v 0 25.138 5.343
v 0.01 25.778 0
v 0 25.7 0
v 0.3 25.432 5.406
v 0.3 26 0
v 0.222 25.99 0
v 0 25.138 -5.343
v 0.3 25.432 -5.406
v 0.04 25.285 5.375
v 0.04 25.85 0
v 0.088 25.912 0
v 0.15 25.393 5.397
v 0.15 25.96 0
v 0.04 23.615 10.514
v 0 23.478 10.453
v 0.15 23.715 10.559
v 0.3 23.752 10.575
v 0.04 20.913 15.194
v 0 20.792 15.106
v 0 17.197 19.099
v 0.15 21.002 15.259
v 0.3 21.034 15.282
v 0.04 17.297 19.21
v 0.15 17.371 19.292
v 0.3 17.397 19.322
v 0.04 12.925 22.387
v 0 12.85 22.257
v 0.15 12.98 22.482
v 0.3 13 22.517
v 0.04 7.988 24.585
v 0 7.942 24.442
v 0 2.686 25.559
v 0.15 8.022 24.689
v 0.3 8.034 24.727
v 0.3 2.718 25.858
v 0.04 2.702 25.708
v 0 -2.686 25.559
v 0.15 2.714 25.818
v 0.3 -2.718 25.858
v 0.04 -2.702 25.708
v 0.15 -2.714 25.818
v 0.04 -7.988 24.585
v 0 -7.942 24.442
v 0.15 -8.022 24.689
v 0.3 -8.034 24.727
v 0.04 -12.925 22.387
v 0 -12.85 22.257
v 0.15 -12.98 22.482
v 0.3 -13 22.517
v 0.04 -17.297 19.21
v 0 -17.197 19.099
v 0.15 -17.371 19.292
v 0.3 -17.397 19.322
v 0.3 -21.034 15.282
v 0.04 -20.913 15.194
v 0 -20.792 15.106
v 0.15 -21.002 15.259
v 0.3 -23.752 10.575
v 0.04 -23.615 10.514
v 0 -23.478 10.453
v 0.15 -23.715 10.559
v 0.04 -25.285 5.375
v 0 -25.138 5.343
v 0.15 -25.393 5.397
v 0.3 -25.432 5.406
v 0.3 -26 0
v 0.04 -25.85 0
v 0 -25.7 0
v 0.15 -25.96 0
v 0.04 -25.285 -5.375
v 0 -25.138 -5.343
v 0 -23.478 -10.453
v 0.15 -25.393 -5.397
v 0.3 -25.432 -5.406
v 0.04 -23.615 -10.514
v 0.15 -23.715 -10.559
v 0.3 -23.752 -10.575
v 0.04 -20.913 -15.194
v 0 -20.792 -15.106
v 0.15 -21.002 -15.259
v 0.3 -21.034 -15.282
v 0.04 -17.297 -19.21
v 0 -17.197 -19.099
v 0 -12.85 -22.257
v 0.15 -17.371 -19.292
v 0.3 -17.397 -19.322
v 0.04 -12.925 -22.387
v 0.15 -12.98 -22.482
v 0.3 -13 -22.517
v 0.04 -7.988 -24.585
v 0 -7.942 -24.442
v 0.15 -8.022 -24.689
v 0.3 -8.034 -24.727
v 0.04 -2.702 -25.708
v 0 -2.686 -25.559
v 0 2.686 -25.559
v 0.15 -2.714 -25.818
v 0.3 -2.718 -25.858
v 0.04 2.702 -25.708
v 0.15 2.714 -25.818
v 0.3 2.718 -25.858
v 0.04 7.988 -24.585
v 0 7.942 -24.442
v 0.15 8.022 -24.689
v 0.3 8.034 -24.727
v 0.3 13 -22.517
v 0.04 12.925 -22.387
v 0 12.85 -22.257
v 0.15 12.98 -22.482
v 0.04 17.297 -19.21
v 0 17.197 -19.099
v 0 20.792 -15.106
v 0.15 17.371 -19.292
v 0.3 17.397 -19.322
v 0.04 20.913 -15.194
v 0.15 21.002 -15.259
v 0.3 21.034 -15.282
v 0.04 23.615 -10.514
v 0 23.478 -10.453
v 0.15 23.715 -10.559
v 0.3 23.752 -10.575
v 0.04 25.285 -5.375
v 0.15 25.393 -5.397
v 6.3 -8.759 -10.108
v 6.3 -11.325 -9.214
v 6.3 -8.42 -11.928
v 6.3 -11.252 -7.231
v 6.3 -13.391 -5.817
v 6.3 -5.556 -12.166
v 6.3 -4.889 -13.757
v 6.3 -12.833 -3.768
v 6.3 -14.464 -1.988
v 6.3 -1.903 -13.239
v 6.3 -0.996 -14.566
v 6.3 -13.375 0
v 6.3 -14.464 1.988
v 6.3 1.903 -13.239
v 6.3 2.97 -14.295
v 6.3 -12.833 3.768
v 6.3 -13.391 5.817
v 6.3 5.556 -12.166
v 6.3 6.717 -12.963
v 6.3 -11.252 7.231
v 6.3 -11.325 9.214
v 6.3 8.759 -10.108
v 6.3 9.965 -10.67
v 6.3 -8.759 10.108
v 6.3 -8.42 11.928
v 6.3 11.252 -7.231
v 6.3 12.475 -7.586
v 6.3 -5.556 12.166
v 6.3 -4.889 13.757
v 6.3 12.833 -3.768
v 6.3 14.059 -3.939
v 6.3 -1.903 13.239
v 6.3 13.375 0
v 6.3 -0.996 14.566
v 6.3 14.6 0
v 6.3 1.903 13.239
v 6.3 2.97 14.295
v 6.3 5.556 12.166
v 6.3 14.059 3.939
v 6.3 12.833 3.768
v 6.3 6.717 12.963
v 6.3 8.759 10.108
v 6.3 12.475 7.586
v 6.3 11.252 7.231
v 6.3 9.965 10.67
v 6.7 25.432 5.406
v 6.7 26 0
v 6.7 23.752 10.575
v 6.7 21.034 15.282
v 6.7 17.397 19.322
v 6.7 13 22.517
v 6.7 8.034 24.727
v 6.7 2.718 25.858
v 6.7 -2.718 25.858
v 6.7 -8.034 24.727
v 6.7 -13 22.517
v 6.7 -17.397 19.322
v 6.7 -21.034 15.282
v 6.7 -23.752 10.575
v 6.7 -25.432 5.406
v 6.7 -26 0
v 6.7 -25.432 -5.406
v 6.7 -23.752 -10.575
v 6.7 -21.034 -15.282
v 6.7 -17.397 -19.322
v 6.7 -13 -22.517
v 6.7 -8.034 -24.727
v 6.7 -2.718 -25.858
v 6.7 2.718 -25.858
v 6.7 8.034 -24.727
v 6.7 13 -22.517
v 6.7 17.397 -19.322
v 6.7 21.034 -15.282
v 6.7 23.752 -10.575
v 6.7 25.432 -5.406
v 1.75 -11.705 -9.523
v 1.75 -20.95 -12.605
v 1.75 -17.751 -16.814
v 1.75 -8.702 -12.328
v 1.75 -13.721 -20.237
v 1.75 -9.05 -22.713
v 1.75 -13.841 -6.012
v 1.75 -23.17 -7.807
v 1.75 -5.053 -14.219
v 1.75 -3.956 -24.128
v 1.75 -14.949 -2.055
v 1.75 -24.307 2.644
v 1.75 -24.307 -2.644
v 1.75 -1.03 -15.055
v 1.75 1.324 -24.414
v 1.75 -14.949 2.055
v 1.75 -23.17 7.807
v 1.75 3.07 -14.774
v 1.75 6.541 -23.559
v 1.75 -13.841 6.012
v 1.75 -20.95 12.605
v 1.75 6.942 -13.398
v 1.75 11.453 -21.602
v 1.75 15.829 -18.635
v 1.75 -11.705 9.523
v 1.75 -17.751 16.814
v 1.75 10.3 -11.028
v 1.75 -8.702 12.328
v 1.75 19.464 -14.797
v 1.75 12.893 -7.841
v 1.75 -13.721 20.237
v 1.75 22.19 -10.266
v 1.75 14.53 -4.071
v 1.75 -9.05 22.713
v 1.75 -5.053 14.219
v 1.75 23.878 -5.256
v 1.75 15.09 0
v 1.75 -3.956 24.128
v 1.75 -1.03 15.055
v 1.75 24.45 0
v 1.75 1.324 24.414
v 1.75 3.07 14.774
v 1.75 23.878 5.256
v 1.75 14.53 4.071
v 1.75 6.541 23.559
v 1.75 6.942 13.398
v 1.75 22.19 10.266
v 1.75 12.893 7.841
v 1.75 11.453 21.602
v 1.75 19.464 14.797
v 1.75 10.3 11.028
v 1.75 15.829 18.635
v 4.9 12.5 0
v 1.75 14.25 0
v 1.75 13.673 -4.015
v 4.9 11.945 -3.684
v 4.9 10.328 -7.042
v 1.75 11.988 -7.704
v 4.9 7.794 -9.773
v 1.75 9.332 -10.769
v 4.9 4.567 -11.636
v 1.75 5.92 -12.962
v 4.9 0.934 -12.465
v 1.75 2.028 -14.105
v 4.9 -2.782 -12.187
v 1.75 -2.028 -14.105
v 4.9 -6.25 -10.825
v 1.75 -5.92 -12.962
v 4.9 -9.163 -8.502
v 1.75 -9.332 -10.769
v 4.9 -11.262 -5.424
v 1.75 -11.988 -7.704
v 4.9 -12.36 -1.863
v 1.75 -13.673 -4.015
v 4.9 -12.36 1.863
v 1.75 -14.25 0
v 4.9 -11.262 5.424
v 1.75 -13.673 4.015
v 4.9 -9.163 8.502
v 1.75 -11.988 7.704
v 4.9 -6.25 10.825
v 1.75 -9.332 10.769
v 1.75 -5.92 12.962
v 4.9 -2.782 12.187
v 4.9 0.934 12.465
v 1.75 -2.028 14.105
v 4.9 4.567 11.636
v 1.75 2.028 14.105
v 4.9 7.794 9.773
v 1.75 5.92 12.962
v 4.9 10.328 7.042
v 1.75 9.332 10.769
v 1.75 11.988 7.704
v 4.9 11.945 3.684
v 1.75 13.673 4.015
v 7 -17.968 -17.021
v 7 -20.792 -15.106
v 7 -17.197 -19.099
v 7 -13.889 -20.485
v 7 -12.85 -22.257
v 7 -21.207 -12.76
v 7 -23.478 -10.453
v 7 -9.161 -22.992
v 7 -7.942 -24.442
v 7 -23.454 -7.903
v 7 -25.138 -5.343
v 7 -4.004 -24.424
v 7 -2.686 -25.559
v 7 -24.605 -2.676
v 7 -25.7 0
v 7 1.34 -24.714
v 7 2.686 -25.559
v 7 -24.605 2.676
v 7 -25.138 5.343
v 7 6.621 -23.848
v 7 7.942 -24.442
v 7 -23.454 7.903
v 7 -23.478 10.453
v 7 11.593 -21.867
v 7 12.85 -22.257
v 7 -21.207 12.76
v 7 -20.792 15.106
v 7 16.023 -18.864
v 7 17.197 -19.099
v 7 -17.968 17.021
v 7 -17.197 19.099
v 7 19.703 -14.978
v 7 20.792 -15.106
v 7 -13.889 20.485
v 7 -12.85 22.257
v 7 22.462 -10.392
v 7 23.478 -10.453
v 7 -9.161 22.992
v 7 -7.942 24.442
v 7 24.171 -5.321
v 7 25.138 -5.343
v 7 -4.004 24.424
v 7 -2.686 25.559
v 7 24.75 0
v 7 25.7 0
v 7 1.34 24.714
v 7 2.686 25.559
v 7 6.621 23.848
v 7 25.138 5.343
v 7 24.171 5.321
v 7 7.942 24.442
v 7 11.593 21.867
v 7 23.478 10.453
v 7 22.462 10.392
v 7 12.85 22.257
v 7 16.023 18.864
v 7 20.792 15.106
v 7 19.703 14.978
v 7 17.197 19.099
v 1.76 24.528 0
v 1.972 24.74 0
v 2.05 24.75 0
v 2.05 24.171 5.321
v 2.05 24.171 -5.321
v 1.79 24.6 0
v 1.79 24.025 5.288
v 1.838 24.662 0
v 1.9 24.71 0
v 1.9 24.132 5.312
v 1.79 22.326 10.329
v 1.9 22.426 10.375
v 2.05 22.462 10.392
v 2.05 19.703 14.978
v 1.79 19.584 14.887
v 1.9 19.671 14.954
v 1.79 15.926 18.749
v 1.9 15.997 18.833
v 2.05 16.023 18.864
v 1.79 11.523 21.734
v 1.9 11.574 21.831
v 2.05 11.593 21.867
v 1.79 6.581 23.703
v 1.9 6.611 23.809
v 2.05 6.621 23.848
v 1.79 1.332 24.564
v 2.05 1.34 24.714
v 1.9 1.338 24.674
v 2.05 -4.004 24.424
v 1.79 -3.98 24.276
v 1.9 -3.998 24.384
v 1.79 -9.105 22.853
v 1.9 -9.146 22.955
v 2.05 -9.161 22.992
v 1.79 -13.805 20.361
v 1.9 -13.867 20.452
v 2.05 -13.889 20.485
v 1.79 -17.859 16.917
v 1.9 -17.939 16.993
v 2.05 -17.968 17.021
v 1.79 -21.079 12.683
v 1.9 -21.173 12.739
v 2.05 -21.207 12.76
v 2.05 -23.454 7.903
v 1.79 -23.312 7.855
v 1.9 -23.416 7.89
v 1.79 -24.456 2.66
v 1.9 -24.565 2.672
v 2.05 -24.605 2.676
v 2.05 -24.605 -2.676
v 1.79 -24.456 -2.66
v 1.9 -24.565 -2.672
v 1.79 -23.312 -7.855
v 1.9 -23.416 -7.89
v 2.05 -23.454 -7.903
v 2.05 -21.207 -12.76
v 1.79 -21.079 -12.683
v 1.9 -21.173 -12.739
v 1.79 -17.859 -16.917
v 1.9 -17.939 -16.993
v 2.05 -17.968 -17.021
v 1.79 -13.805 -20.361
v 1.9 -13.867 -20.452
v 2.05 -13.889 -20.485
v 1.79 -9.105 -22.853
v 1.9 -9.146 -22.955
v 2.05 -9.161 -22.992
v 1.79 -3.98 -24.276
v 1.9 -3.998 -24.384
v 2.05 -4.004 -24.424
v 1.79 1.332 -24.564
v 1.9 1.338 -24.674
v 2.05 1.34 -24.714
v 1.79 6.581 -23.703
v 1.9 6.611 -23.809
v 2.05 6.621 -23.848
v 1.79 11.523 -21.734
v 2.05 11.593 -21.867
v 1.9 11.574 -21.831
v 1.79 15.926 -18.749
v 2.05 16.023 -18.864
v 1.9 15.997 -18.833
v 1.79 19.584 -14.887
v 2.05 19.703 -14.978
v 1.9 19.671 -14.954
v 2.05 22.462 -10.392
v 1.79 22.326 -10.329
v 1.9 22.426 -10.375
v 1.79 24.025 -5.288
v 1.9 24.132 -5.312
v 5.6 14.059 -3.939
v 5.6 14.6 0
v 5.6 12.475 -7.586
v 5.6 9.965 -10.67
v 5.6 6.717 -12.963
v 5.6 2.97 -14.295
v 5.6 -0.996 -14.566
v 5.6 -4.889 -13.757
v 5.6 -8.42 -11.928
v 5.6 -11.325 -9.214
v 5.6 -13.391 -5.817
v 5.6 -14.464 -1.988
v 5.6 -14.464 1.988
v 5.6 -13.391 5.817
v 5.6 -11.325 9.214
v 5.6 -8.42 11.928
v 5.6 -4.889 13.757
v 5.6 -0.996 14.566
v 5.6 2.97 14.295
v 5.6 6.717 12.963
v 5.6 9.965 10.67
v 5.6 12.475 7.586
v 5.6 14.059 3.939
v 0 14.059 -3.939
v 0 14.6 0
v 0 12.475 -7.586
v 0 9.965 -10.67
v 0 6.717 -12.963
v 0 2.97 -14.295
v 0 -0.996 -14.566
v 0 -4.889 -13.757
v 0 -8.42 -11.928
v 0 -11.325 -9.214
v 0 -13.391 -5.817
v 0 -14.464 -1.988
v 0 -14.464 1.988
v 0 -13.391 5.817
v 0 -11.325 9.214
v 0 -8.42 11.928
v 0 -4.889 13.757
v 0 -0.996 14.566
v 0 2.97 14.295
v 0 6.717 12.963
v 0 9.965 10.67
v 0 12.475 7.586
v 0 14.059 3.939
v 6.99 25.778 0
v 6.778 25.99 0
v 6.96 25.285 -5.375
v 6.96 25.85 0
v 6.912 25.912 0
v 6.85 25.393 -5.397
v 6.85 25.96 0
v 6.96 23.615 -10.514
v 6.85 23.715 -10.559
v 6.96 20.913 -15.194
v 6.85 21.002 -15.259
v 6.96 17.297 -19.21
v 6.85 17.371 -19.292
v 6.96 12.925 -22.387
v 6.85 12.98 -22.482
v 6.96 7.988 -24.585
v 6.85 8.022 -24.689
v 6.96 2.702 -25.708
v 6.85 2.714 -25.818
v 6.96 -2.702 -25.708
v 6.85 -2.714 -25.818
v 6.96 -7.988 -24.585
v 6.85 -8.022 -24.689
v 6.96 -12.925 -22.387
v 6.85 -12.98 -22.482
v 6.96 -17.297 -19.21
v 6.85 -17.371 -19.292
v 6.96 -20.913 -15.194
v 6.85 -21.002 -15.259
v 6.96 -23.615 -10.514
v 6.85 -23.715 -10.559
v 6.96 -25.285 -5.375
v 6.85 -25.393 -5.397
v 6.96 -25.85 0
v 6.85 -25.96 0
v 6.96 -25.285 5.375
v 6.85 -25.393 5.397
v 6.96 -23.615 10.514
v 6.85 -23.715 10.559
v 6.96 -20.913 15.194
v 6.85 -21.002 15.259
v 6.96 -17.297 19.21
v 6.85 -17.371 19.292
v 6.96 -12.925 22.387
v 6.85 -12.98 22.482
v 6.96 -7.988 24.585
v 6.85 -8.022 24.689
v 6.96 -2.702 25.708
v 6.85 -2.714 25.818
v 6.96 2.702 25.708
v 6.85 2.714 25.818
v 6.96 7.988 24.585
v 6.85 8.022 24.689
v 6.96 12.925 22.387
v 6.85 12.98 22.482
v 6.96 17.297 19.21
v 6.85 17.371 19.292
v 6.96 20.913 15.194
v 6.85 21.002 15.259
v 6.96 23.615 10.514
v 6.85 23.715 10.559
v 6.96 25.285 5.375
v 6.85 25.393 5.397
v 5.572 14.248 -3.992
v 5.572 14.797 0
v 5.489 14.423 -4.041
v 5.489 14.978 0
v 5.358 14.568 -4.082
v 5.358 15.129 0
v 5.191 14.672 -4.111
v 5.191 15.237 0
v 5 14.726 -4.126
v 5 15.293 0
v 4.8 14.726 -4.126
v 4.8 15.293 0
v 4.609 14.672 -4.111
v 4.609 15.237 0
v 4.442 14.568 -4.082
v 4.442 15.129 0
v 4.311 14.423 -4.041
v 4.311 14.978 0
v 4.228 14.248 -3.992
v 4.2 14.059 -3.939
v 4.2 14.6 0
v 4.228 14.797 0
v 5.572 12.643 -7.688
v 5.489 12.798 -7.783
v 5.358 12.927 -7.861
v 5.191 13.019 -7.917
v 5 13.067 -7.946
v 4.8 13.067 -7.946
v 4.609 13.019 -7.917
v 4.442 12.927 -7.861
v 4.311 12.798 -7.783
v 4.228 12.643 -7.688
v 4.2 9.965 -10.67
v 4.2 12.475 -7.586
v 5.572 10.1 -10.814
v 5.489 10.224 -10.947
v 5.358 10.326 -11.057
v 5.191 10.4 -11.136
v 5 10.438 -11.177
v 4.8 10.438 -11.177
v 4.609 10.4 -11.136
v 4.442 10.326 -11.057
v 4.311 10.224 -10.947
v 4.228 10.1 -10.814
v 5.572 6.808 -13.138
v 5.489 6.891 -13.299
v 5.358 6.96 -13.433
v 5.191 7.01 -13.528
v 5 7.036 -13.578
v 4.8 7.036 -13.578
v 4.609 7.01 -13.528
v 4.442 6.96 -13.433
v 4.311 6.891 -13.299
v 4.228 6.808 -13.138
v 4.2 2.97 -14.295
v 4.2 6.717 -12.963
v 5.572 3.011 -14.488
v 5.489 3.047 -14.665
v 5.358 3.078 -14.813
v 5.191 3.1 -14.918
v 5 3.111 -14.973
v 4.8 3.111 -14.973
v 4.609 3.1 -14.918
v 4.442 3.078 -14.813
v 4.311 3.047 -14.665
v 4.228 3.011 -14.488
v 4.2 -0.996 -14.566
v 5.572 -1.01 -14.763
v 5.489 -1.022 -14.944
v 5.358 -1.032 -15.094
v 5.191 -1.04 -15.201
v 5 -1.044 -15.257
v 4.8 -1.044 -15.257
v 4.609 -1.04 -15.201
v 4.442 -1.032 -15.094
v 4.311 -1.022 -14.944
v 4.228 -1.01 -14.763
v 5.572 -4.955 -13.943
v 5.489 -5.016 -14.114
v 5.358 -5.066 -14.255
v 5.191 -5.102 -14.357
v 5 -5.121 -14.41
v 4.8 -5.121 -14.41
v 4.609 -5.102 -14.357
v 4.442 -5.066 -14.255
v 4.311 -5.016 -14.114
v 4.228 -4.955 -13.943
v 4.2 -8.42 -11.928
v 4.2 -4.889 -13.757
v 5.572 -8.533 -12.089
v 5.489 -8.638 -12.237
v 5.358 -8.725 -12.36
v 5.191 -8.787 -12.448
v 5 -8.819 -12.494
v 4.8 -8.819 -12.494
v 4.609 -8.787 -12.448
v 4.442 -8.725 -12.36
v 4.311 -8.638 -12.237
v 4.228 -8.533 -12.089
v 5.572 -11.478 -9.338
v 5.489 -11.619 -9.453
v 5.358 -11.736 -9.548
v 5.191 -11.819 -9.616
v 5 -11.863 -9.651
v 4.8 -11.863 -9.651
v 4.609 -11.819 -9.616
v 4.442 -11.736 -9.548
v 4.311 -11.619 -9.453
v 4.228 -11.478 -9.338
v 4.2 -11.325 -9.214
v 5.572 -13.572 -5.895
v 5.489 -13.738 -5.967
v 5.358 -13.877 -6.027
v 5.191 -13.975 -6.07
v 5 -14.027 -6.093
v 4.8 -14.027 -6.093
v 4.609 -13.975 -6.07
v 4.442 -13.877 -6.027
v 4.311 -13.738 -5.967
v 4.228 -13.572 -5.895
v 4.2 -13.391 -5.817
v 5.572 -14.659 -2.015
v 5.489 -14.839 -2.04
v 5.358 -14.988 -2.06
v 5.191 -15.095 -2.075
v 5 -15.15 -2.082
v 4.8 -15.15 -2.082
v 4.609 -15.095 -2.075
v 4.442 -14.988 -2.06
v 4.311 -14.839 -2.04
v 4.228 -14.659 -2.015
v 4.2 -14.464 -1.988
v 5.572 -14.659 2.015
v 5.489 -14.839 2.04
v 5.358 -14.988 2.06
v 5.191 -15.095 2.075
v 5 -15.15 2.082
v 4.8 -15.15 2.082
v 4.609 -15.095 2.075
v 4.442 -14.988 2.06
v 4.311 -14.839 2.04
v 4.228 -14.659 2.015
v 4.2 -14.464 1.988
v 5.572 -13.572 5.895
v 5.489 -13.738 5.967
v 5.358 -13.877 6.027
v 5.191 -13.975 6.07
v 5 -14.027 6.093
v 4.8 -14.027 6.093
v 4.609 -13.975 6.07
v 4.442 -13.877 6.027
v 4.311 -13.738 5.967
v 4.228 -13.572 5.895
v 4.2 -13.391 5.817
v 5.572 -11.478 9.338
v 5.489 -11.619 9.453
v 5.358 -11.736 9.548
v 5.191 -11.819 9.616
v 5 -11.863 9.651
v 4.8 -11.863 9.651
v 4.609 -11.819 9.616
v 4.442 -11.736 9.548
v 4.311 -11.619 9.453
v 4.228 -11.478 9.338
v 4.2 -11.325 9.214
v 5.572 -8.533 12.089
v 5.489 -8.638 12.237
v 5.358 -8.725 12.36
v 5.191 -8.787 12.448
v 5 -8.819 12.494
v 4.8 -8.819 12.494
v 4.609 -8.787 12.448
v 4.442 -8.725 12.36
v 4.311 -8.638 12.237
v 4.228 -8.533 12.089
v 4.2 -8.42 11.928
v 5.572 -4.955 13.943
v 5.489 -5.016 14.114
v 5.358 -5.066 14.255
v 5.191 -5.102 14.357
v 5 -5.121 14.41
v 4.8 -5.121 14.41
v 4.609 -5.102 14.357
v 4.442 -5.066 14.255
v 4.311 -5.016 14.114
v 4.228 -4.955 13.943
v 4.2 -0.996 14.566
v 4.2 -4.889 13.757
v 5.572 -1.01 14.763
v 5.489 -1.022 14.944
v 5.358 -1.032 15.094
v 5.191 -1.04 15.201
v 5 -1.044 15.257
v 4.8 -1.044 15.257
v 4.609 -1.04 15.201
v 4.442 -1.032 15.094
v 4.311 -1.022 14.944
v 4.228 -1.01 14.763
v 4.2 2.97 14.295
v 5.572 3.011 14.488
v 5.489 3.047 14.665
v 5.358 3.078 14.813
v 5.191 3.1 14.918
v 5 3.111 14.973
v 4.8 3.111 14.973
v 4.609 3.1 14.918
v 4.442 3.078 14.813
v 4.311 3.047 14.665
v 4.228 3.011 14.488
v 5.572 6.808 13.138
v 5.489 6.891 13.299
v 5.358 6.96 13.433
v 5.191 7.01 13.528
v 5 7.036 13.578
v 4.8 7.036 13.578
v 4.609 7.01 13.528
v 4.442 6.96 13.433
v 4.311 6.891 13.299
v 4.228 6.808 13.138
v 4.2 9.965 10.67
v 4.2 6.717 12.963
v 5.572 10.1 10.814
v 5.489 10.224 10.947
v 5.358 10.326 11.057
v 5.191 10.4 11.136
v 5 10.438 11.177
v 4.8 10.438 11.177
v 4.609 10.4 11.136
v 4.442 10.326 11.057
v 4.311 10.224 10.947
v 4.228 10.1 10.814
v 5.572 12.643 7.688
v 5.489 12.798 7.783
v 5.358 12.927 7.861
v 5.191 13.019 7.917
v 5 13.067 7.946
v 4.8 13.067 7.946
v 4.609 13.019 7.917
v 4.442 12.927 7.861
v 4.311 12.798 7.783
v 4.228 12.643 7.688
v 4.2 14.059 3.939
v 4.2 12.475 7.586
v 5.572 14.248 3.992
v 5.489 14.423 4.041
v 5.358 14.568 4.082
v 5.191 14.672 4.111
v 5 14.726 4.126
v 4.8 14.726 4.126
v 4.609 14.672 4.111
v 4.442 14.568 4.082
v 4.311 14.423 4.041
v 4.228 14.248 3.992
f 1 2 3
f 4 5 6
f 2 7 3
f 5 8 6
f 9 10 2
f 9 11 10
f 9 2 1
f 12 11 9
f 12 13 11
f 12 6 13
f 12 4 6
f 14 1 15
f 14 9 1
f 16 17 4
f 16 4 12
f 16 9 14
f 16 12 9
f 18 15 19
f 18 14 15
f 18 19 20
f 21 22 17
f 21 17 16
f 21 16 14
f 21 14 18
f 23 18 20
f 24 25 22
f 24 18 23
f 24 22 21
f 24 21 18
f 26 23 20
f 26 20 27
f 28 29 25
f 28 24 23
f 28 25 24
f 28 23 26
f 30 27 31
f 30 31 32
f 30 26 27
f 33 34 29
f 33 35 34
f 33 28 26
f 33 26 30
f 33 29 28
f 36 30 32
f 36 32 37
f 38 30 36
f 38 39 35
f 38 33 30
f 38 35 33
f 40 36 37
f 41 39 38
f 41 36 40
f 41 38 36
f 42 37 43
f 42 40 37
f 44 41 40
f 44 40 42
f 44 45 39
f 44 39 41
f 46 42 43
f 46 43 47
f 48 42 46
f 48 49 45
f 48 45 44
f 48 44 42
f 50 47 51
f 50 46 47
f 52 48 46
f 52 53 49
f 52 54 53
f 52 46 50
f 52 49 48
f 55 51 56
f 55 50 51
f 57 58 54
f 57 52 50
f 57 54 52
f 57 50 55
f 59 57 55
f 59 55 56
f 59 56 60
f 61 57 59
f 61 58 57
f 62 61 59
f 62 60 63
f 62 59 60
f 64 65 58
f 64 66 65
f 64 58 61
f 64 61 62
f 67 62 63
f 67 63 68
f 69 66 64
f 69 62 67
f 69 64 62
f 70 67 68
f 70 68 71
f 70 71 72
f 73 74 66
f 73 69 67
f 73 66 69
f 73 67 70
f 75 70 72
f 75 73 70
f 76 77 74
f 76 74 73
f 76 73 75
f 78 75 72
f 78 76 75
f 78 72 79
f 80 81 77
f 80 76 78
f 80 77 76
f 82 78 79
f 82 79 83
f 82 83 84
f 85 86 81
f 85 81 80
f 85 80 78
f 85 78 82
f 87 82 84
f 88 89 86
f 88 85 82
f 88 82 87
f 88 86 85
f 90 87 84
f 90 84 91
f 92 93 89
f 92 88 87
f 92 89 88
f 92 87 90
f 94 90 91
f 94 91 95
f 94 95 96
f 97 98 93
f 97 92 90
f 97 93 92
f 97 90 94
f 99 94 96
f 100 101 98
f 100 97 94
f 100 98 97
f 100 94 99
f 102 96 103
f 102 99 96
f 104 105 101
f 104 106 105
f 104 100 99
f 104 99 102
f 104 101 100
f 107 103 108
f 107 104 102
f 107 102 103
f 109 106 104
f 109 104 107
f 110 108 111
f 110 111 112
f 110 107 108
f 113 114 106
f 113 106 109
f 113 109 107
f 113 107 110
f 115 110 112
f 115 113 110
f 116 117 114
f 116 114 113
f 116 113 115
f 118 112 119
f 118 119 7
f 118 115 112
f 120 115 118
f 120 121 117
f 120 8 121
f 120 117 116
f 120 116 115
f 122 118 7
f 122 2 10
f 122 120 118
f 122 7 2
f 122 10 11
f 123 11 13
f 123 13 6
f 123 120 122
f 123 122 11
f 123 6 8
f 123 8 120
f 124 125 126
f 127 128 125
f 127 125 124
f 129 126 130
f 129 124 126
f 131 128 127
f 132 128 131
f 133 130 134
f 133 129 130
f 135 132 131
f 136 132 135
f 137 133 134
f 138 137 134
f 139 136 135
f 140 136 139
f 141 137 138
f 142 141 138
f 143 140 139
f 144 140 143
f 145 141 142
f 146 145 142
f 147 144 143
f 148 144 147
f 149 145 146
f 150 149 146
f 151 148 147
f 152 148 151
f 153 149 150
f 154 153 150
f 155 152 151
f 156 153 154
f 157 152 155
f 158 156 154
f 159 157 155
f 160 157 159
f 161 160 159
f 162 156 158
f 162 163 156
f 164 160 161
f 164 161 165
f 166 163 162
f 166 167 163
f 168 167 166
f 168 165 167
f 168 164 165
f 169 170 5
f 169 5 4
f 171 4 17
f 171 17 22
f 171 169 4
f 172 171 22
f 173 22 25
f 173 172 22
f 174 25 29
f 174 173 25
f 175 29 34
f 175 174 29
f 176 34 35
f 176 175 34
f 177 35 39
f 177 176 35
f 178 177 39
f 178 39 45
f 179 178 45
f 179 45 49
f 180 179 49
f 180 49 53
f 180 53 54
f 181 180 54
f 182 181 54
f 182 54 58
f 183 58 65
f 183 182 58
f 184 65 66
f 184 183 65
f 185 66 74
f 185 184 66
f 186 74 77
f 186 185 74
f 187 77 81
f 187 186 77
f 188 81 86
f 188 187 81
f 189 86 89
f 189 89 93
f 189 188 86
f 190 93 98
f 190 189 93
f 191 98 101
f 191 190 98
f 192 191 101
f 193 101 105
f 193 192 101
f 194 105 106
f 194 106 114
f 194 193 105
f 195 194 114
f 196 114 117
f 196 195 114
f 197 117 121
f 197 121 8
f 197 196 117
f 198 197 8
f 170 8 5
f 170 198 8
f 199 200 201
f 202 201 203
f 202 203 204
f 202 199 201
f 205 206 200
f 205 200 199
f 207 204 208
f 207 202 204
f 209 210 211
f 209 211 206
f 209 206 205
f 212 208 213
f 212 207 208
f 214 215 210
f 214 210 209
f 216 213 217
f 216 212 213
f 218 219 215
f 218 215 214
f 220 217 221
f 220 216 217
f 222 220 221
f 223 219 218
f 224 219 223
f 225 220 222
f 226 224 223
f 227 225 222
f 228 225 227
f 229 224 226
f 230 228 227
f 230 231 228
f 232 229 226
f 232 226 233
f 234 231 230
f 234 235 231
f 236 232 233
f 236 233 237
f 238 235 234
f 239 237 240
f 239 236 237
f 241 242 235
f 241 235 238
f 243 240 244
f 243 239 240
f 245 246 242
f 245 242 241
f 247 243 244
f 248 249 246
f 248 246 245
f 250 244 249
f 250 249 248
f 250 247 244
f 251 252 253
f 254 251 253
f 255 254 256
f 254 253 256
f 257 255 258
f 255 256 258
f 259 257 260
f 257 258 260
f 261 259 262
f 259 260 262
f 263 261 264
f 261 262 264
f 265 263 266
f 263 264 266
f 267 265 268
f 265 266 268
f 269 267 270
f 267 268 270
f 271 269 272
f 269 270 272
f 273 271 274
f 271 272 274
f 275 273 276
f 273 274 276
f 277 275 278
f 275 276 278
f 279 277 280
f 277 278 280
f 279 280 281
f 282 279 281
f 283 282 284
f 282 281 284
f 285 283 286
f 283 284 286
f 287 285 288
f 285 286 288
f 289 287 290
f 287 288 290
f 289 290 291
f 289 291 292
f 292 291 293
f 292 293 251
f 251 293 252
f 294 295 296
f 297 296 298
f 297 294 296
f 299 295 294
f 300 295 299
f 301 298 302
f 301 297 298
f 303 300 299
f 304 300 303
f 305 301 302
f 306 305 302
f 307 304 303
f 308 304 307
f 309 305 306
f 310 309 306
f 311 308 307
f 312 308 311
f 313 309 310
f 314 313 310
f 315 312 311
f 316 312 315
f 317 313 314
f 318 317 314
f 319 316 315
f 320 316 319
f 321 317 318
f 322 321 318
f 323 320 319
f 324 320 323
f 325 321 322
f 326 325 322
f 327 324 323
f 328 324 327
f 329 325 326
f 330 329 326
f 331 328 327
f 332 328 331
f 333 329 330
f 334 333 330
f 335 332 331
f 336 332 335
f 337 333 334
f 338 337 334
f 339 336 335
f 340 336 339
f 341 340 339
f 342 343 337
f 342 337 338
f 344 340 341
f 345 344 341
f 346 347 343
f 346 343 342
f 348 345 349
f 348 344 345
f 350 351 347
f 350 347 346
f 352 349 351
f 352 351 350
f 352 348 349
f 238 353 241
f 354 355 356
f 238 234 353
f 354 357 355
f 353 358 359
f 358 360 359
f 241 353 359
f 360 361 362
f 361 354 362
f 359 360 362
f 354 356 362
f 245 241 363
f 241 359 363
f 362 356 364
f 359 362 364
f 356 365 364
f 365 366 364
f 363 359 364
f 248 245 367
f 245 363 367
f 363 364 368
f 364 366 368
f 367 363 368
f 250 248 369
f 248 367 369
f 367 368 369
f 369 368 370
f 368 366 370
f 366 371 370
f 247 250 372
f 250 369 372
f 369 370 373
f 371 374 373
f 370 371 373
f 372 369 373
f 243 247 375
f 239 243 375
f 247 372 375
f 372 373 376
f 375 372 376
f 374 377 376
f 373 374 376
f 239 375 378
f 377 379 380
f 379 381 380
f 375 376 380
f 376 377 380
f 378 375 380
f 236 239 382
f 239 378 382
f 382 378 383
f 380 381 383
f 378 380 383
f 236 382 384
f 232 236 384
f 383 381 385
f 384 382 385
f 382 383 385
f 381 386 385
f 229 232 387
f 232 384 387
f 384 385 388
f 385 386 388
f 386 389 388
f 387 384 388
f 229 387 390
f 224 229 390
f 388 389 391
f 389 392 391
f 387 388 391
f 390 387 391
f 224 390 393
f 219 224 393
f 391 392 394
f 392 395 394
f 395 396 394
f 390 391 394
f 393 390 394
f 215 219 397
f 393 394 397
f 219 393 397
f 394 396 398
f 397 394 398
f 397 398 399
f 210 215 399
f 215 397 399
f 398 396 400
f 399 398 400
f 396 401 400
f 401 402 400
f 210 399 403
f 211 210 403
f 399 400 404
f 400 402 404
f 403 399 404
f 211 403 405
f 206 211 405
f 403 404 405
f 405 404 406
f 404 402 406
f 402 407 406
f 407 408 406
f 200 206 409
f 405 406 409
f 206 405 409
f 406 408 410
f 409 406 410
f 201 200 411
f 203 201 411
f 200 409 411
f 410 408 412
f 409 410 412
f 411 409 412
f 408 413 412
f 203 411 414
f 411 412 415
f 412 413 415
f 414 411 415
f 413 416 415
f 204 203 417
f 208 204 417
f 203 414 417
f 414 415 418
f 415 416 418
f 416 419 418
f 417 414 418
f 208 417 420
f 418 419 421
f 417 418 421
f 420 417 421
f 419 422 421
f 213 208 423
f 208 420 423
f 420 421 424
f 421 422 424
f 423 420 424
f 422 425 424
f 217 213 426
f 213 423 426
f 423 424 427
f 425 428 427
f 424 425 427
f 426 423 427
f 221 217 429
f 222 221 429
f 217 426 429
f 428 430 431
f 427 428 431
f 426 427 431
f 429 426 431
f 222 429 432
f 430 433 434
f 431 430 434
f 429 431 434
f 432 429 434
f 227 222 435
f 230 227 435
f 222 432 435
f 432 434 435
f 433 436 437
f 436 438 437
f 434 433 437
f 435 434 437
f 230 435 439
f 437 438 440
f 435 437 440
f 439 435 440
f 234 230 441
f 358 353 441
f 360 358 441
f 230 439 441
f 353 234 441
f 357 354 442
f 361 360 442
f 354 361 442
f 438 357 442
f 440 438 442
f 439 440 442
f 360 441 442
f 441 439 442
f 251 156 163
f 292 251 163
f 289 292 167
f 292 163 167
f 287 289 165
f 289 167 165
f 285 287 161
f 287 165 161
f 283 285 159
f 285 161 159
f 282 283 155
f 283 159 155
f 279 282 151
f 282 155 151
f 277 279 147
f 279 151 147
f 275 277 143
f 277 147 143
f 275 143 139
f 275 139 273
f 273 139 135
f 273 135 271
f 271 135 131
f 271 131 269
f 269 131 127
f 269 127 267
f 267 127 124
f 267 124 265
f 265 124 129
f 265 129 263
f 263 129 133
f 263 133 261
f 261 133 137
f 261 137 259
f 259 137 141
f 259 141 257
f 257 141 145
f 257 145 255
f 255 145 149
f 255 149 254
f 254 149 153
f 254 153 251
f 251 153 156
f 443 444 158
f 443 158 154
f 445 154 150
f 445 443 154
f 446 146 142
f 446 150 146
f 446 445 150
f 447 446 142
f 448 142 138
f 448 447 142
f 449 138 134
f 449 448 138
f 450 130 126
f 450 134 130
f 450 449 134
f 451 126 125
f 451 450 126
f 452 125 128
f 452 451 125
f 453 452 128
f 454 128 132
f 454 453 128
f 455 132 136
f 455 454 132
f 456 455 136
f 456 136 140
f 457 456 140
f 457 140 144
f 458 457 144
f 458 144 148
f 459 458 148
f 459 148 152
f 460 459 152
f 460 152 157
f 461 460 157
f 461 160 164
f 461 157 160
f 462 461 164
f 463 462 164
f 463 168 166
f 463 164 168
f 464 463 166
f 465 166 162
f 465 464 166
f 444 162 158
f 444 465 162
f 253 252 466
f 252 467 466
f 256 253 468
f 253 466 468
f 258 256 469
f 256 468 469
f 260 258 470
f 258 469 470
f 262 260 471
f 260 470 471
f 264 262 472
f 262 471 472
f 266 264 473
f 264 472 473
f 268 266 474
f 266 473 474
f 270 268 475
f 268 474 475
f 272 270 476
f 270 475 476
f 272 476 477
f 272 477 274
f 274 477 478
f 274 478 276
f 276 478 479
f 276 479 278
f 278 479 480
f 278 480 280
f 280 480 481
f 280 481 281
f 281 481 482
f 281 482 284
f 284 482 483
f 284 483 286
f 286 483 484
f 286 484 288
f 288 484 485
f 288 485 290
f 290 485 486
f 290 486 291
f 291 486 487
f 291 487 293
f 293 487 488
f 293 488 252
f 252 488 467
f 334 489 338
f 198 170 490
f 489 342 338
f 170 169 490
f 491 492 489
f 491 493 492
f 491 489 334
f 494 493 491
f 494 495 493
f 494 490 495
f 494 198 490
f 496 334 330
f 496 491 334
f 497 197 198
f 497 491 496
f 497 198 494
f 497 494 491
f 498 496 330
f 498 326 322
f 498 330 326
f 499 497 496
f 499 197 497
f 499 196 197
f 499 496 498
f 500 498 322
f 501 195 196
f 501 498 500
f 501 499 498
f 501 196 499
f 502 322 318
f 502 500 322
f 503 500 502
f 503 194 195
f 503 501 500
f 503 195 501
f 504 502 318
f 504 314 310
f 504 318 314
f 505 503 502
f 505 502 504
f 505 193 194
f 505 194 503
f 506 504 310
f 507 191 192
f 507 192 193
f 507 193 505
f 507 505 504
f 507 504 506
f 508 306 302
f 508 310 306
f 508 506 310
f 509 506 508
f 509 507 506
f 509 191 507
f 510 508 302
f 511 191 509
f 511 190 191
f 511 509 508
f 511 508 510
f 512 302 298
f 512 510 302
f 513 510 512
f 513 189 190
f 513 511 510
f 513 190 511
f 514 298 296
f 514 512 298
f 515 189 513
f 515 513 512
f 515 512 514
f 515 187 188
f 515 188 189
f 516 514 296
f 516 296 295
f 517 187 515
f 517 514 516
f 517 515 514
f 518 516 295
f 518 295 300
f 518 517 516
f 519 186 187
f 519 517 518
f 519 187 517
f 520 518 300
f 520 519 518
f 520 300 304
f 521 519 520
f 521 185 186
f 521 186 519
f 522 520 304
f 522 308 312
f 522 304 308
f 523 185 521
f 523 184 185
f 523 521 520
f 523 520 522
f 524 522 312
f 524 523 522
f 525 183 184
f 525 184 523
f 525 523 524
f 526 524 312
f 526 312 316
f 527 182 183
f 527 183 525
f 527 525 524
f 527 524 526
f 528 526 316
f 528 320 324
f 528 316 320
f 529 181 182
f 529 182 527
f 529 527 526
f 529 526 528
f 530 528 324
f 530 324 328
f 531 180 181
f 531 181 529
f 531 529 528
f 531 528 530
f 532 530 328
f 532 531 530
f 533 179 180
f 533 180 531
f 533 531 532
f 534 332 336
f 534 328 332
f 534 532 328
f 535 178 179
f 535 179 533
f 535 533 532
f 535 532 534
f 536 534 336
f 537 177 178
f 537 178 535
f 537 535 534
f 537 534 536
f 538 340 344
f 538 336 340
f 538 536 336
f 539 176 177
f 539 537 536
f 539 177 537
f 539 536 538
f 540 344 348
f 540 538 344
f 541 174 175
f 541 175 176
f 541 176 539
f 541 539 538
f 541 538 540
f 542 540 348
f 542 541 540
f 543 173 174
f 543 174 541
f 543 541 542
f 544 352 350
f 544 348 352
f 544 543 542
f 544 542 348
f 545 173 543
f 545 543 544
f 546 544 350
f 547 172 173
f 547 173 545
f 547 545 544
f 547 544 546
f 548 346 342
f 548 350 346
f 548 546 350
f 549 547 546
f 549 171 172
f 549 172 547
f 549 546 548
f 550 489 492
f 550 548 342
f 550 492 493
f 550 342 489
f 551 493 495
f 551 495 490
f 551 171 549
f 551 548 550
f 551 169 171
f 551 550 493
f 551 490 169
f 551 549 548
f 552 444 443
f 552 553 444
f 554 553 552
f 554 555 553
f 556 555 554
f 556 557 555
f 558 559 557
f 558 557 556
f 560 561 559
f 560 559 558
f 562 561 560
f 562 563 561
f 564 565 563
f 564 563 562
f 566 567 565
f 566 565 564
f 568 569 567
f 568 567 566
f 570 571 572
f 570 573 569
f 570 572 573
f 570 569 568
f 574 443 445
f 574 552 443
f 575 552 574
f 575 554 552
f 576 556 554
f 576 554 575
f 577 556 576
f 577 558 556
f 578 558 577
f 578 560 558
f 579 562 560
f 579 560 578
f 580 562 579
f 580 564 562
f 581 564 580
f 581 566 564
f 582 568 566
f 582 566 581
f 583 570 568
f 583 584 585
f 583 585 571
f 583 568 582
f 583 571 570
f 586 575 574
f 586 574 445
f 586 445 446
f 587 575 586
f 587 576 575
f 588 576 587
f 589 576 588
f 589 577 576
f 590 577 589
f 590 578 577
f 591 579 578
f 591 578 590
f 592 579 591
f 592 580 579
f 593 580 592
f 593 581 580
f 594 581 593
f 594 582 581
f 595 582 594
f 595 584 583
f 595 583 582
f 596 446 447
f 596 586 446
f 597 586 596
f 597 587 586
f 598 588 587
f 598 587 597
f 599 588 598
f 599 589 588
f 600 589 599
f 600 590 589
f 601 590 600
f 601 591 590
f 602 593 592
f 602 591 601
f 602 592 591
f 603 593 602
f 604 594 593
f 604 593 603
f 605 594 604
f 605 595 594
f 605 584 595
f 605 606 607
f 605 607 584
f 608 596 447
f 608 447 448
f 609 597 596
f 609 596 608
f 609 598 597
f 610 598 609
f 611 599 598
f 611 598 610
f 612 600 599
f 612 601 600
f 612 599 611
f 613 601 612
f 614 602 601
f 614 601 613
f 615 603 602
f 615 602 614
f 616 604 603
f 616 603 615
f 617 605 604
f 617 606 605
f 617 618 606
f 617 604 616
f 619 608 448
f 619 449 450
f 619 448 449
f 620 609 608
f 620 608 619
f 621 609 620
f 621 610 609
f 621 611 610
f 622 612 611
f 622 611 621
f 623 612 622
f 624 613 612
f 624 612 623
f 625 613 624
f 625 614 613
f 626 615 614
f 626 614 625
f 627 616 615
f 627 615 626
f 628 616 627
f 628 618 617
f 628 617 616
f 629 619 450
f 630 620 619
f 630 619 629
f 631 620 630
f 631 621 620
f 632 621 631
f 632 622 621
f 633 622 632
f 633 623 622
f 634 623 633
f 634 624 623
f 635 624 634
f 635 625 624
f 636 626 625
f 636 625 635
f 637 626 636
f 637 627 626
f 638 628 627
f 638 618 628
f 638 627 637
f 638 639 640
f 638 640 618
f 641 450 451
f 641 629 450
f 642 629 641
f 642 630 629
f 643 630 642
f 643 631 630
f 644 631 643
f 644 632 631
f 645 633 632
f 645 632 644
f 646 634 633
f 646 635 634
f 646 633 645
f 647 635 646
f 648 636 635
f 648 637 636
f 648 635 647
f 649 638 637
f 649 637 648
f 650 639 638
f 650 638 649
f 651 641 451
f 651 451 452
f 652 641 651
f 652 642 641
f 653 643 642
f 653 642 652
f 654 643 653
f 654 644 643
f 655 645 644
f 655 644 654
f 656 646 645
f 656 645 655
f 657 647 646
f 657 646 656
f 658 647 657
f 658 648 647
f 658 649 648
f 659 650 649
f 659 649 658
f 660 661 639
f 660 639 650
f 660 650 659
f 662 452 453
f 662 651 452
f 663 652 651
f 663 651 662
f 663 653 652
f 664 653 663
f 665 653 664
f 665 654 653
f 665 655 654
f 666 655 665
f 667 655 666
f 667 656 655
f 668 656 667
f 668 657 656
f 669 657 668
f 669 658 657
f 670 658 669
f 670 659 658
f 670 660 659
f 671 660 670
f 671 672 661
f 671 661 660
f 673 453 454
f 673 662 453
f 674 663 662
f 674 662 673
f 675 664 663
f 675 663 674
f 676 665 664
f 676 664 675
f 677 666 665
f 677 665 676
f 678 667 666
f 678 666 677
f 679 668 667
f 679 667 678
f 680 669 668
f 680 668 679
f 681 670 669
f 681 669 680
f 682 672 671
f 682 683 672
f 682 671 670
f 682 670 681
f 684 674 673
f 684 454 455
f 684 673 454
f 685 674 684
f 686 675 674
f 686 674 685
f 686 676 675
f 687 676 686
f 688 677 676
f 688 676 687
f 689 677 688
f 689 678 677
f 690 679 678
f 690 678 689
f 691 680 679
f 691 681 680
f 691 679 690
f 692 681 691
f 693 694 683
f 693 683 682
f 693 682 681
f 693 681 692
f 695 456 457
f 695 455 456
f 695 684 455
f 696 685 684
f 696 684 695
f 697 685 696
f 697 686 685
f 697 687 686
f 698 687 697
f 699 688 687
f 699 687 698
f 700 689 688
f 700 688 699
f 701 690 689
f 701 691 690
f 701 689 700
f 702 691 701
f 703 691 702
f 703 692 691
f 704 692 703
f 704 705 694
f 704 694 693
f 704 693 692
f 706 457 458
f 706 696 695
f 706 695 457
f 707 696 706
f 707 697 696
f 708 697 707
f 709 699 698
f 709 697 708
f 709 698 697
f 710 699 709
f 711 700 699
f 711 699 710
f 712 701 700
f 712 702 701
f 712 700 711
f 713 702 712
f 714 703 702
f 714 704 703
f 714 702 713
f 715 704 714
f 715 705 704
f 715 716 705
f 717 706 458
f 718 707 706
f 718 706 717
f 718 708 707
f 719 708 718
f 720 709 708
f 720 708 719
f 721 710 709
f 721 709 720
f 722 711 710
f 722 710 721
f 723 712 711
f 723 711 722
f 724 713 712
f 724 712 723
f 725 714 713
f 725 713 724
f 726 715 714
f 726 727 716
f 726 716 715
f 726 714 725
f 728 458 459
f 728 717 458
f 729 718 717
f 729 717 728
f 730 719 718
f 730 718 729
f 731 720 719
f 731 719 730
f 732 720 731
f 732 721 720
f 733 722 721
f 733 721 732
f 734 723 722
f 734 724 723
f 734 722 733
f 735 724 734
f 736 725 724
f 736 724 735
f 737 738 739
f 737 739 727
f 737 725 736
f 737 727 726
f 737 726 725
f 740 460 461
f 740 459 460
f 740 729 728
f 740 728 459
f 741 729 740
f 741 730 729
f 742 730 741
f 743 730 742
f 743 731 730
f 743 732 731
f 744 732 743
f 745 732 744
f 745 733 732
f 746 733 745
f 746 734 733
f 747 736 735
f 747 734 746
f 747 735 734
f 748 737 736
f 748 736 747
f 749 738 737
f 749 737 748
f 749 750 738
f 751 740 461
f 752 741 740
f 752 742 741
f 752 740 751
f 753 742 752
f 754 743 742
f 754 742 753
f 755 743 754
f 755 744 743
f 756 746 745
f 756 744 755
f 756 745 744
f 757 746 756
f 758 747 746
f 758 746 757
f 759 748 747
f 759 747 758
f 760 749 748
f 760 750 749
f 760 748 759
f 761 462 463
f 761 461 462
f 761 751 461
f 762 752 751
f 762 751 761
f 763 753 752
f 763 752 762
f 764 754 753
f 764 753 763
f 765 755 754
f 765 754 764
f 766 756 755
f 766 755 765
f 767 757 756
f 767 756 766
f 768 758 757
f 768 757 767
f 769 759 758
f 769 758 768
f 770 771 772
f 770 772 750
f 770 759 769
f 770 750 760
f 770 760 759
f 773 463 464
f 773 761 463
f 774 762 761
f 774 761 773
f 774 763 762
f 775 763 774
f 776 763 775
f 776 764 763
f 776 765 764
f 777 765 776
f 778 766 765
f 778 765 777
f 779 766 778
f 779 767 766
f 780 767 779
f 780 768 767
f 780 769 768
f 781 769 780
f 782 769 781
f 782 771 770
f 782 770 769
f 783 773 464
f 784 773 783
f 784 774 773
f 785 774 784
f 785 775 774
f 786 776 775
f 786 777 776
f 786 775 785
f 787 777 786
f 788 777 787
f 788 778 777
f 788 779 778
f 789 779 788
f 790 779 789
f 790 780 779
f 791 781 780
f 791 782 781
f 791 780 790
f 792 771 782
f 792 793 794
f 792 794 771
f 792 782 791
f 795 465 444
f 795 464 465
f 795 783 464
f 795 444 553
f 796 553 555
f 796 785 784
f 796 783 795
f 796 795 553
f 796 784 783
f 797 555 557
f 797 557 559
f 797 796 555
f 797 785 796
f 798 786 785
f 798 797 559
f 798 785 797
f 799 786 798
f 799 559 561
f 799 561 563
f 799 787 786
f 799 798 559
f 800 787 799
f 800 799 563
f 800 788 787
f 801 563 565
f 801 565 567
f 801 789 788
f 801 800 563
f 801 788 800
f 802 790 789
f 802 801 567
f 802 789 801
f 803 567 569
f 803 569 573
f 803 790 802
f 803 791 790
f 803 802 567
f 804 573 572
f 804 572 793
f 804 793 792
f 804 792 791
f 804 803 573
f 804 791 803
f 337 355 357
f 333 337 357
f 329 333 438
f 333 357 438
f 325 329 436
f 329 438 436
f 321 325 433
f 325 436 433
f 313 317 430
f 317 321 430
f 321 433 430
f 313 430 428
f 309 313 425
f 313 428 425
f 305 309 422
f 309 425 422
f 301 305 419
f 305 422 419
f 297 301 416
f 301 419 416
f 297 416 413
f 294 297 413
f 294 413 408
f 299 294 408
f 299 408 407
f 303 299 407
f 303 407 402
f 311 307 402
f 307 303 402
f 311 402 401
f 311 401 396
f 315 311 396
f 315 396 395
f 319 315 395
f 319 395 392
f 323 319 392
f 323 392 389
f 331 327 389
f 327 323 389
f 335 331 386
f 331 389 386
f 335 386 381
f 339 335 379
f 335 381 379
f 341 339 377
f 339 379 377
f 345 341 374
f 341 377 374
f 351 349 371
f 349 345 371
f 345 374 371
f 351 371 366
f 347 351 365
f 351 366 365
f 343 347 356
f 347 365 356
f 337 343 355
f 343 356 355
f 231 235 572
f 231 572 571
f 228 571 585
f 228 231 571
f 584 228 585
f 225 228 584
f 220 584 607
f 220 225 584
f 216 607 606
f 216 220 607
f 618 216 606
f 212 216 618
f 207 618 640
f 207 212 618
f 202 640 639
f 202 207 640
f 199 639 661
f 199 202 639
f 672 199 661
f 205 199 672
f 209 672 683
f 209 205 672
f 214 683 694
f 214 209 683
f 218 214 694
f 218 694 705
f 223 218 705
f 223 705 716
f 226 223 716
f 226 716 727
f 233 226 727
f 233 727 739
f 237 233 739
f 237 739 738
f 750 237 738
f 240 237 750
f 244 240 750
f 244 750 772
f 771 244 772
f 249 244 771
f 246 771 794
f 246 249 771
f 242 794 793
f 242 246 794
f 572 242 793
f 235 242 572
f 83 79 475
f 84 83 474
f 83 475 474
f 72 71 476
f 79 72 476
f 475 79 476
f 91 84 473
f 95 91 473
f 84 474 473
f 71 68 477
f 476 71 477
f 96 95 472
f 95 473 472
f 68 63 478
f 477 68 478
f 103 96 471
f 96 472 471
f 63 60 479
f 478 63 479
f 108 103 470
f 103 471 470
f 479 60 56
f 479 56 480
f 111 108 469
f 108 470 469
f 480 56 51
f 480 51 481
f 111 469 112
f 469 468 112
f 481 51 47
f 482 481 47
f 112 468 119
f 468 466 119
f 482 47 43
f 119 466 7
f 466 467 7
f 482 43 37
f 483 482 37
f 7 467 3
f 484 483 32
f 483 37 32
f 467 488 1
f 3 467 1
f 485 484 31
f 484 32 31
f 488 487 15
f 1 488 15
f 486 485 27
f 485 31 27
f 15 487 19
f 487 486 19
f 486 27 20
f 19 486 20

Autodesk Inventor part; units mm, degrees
ref_plane "YZ Plane" through (0, 0, 0) normal (1, 0, 0) x (0, 1, 0)
ref_plane "XZ Plane" through (0, 0, 0) normal (0, 1, 0) x (-1, 0, 0)
ref_plane "XY Plane" through (0, 0, 0) normal (0, 0, 1) x (1, 0, 0)
sketch "Sketch1" plane through (0, 0, 0) normal (0, 0, 1) x (1, 0, 0)
  circle A0 centre (4.9, 14.6) radius 0.455
  circle A1 centre (4.9, 14.6) radius 0.7
  line L0 (6.3, 13.375) -> (6.3, 14.6)
  line L1 (0, 26) -> (7, 26)
  line L2 (7, 26) -> (7, 24.75)
  line L3 (7, 24.75) -> (1.75, 24.75)
  line L4 (0, 0) -> (9.5856, 0)
  line L5 (0, 26) -> (0, 14.6)
  line L6 (0, 14.6) -> (1.75, 14.25)
  line L7 (1.75, 14.25) -> (4.9, 12.5)
  line L8 (4.9, 12.5) -> (6.3, 13.375)
  line L9 (4.9, 12.5) -> (0, 12.5) construction
  line L10 (0, 18) -> (0, -3) projected
  line L11 (-1.9171, 0) -> (11.5027, 0) projected
  line L12 (4.2, 14.6) -> (1.75, 15.09)
  line L13 (1.75, 15.09) -> (1.75, 24.75)
  line L14 (6.3, 14.6) -> (5.6, 14.6)
  dimension "d0" = 52
  dimension "d1" = 26.75
  dimension "d2" = 1.25
  dimension "d3" = 0.91
  dimension "d4" = 1.4
  dimension "d5" = 25
  dimension "d6" = 28.5
  dimension "d7" = 29.2
  dimension "d8" = 4.9
  dimension "d9" = 6.3
  dimension "d10" = 7
  dimension "d12" = 1.75
revolve "Body" add sketch "Sketch1" angle 360 about axis through (0, 0, 0) along (1, 0, 0) contours L14 L0 L8 L7 L6 L5 L1 L2 L3 L13 L12 A1
revolve "Spring1" add sketch "Sketch1" angle 360 about axis through (0, 0, 0) along (1, 0, 0) contours A0 | A1
fillet "Fillet1" radius 0.3 3 edges at (7, -26, 0) (1.75, -24.75, 0) (0, -26, 0)
equation "\"d0\" = SD2"
equation "\"d1\" = ABDM"
equation "\"d3\" = SPDI"
equation "\"d4\" = SPDA"
equation "\"d5\" = NND"
equation "\"d6\" = TKDM"
equation "\"d7\" = HLDM"
equation "\"d8\" = SPDST"
equation "\"d9\" = SDI"
equation "\"d10\" = SWDT"
equation "\"d12\" = SD"
equation "\"d11\" = RR"
equation "\"SD2\" = 52"
equation "\"SWDT\" = 7"
equation "\"RR\" = 0.3"
equation "\"SD\" = 1.75"
equation "\"NND\" = 25"
equation "\"SPDA\" = 1.4"
equation "\"SPDI\" = 0.91"
equation "\"TKDM\" = 28.5"
equation "\"HLDM\" = 29.2"
equation "\"ABDM\" = 26.75"
equation "\"SDI\" = 6.3"
equation "\"SPDST\" = 4.9"
equation "\"LAB\" = 0.35"
properties part number "CSN 02 9401 - G 25x52x7 - NBR" material "Rubber"
